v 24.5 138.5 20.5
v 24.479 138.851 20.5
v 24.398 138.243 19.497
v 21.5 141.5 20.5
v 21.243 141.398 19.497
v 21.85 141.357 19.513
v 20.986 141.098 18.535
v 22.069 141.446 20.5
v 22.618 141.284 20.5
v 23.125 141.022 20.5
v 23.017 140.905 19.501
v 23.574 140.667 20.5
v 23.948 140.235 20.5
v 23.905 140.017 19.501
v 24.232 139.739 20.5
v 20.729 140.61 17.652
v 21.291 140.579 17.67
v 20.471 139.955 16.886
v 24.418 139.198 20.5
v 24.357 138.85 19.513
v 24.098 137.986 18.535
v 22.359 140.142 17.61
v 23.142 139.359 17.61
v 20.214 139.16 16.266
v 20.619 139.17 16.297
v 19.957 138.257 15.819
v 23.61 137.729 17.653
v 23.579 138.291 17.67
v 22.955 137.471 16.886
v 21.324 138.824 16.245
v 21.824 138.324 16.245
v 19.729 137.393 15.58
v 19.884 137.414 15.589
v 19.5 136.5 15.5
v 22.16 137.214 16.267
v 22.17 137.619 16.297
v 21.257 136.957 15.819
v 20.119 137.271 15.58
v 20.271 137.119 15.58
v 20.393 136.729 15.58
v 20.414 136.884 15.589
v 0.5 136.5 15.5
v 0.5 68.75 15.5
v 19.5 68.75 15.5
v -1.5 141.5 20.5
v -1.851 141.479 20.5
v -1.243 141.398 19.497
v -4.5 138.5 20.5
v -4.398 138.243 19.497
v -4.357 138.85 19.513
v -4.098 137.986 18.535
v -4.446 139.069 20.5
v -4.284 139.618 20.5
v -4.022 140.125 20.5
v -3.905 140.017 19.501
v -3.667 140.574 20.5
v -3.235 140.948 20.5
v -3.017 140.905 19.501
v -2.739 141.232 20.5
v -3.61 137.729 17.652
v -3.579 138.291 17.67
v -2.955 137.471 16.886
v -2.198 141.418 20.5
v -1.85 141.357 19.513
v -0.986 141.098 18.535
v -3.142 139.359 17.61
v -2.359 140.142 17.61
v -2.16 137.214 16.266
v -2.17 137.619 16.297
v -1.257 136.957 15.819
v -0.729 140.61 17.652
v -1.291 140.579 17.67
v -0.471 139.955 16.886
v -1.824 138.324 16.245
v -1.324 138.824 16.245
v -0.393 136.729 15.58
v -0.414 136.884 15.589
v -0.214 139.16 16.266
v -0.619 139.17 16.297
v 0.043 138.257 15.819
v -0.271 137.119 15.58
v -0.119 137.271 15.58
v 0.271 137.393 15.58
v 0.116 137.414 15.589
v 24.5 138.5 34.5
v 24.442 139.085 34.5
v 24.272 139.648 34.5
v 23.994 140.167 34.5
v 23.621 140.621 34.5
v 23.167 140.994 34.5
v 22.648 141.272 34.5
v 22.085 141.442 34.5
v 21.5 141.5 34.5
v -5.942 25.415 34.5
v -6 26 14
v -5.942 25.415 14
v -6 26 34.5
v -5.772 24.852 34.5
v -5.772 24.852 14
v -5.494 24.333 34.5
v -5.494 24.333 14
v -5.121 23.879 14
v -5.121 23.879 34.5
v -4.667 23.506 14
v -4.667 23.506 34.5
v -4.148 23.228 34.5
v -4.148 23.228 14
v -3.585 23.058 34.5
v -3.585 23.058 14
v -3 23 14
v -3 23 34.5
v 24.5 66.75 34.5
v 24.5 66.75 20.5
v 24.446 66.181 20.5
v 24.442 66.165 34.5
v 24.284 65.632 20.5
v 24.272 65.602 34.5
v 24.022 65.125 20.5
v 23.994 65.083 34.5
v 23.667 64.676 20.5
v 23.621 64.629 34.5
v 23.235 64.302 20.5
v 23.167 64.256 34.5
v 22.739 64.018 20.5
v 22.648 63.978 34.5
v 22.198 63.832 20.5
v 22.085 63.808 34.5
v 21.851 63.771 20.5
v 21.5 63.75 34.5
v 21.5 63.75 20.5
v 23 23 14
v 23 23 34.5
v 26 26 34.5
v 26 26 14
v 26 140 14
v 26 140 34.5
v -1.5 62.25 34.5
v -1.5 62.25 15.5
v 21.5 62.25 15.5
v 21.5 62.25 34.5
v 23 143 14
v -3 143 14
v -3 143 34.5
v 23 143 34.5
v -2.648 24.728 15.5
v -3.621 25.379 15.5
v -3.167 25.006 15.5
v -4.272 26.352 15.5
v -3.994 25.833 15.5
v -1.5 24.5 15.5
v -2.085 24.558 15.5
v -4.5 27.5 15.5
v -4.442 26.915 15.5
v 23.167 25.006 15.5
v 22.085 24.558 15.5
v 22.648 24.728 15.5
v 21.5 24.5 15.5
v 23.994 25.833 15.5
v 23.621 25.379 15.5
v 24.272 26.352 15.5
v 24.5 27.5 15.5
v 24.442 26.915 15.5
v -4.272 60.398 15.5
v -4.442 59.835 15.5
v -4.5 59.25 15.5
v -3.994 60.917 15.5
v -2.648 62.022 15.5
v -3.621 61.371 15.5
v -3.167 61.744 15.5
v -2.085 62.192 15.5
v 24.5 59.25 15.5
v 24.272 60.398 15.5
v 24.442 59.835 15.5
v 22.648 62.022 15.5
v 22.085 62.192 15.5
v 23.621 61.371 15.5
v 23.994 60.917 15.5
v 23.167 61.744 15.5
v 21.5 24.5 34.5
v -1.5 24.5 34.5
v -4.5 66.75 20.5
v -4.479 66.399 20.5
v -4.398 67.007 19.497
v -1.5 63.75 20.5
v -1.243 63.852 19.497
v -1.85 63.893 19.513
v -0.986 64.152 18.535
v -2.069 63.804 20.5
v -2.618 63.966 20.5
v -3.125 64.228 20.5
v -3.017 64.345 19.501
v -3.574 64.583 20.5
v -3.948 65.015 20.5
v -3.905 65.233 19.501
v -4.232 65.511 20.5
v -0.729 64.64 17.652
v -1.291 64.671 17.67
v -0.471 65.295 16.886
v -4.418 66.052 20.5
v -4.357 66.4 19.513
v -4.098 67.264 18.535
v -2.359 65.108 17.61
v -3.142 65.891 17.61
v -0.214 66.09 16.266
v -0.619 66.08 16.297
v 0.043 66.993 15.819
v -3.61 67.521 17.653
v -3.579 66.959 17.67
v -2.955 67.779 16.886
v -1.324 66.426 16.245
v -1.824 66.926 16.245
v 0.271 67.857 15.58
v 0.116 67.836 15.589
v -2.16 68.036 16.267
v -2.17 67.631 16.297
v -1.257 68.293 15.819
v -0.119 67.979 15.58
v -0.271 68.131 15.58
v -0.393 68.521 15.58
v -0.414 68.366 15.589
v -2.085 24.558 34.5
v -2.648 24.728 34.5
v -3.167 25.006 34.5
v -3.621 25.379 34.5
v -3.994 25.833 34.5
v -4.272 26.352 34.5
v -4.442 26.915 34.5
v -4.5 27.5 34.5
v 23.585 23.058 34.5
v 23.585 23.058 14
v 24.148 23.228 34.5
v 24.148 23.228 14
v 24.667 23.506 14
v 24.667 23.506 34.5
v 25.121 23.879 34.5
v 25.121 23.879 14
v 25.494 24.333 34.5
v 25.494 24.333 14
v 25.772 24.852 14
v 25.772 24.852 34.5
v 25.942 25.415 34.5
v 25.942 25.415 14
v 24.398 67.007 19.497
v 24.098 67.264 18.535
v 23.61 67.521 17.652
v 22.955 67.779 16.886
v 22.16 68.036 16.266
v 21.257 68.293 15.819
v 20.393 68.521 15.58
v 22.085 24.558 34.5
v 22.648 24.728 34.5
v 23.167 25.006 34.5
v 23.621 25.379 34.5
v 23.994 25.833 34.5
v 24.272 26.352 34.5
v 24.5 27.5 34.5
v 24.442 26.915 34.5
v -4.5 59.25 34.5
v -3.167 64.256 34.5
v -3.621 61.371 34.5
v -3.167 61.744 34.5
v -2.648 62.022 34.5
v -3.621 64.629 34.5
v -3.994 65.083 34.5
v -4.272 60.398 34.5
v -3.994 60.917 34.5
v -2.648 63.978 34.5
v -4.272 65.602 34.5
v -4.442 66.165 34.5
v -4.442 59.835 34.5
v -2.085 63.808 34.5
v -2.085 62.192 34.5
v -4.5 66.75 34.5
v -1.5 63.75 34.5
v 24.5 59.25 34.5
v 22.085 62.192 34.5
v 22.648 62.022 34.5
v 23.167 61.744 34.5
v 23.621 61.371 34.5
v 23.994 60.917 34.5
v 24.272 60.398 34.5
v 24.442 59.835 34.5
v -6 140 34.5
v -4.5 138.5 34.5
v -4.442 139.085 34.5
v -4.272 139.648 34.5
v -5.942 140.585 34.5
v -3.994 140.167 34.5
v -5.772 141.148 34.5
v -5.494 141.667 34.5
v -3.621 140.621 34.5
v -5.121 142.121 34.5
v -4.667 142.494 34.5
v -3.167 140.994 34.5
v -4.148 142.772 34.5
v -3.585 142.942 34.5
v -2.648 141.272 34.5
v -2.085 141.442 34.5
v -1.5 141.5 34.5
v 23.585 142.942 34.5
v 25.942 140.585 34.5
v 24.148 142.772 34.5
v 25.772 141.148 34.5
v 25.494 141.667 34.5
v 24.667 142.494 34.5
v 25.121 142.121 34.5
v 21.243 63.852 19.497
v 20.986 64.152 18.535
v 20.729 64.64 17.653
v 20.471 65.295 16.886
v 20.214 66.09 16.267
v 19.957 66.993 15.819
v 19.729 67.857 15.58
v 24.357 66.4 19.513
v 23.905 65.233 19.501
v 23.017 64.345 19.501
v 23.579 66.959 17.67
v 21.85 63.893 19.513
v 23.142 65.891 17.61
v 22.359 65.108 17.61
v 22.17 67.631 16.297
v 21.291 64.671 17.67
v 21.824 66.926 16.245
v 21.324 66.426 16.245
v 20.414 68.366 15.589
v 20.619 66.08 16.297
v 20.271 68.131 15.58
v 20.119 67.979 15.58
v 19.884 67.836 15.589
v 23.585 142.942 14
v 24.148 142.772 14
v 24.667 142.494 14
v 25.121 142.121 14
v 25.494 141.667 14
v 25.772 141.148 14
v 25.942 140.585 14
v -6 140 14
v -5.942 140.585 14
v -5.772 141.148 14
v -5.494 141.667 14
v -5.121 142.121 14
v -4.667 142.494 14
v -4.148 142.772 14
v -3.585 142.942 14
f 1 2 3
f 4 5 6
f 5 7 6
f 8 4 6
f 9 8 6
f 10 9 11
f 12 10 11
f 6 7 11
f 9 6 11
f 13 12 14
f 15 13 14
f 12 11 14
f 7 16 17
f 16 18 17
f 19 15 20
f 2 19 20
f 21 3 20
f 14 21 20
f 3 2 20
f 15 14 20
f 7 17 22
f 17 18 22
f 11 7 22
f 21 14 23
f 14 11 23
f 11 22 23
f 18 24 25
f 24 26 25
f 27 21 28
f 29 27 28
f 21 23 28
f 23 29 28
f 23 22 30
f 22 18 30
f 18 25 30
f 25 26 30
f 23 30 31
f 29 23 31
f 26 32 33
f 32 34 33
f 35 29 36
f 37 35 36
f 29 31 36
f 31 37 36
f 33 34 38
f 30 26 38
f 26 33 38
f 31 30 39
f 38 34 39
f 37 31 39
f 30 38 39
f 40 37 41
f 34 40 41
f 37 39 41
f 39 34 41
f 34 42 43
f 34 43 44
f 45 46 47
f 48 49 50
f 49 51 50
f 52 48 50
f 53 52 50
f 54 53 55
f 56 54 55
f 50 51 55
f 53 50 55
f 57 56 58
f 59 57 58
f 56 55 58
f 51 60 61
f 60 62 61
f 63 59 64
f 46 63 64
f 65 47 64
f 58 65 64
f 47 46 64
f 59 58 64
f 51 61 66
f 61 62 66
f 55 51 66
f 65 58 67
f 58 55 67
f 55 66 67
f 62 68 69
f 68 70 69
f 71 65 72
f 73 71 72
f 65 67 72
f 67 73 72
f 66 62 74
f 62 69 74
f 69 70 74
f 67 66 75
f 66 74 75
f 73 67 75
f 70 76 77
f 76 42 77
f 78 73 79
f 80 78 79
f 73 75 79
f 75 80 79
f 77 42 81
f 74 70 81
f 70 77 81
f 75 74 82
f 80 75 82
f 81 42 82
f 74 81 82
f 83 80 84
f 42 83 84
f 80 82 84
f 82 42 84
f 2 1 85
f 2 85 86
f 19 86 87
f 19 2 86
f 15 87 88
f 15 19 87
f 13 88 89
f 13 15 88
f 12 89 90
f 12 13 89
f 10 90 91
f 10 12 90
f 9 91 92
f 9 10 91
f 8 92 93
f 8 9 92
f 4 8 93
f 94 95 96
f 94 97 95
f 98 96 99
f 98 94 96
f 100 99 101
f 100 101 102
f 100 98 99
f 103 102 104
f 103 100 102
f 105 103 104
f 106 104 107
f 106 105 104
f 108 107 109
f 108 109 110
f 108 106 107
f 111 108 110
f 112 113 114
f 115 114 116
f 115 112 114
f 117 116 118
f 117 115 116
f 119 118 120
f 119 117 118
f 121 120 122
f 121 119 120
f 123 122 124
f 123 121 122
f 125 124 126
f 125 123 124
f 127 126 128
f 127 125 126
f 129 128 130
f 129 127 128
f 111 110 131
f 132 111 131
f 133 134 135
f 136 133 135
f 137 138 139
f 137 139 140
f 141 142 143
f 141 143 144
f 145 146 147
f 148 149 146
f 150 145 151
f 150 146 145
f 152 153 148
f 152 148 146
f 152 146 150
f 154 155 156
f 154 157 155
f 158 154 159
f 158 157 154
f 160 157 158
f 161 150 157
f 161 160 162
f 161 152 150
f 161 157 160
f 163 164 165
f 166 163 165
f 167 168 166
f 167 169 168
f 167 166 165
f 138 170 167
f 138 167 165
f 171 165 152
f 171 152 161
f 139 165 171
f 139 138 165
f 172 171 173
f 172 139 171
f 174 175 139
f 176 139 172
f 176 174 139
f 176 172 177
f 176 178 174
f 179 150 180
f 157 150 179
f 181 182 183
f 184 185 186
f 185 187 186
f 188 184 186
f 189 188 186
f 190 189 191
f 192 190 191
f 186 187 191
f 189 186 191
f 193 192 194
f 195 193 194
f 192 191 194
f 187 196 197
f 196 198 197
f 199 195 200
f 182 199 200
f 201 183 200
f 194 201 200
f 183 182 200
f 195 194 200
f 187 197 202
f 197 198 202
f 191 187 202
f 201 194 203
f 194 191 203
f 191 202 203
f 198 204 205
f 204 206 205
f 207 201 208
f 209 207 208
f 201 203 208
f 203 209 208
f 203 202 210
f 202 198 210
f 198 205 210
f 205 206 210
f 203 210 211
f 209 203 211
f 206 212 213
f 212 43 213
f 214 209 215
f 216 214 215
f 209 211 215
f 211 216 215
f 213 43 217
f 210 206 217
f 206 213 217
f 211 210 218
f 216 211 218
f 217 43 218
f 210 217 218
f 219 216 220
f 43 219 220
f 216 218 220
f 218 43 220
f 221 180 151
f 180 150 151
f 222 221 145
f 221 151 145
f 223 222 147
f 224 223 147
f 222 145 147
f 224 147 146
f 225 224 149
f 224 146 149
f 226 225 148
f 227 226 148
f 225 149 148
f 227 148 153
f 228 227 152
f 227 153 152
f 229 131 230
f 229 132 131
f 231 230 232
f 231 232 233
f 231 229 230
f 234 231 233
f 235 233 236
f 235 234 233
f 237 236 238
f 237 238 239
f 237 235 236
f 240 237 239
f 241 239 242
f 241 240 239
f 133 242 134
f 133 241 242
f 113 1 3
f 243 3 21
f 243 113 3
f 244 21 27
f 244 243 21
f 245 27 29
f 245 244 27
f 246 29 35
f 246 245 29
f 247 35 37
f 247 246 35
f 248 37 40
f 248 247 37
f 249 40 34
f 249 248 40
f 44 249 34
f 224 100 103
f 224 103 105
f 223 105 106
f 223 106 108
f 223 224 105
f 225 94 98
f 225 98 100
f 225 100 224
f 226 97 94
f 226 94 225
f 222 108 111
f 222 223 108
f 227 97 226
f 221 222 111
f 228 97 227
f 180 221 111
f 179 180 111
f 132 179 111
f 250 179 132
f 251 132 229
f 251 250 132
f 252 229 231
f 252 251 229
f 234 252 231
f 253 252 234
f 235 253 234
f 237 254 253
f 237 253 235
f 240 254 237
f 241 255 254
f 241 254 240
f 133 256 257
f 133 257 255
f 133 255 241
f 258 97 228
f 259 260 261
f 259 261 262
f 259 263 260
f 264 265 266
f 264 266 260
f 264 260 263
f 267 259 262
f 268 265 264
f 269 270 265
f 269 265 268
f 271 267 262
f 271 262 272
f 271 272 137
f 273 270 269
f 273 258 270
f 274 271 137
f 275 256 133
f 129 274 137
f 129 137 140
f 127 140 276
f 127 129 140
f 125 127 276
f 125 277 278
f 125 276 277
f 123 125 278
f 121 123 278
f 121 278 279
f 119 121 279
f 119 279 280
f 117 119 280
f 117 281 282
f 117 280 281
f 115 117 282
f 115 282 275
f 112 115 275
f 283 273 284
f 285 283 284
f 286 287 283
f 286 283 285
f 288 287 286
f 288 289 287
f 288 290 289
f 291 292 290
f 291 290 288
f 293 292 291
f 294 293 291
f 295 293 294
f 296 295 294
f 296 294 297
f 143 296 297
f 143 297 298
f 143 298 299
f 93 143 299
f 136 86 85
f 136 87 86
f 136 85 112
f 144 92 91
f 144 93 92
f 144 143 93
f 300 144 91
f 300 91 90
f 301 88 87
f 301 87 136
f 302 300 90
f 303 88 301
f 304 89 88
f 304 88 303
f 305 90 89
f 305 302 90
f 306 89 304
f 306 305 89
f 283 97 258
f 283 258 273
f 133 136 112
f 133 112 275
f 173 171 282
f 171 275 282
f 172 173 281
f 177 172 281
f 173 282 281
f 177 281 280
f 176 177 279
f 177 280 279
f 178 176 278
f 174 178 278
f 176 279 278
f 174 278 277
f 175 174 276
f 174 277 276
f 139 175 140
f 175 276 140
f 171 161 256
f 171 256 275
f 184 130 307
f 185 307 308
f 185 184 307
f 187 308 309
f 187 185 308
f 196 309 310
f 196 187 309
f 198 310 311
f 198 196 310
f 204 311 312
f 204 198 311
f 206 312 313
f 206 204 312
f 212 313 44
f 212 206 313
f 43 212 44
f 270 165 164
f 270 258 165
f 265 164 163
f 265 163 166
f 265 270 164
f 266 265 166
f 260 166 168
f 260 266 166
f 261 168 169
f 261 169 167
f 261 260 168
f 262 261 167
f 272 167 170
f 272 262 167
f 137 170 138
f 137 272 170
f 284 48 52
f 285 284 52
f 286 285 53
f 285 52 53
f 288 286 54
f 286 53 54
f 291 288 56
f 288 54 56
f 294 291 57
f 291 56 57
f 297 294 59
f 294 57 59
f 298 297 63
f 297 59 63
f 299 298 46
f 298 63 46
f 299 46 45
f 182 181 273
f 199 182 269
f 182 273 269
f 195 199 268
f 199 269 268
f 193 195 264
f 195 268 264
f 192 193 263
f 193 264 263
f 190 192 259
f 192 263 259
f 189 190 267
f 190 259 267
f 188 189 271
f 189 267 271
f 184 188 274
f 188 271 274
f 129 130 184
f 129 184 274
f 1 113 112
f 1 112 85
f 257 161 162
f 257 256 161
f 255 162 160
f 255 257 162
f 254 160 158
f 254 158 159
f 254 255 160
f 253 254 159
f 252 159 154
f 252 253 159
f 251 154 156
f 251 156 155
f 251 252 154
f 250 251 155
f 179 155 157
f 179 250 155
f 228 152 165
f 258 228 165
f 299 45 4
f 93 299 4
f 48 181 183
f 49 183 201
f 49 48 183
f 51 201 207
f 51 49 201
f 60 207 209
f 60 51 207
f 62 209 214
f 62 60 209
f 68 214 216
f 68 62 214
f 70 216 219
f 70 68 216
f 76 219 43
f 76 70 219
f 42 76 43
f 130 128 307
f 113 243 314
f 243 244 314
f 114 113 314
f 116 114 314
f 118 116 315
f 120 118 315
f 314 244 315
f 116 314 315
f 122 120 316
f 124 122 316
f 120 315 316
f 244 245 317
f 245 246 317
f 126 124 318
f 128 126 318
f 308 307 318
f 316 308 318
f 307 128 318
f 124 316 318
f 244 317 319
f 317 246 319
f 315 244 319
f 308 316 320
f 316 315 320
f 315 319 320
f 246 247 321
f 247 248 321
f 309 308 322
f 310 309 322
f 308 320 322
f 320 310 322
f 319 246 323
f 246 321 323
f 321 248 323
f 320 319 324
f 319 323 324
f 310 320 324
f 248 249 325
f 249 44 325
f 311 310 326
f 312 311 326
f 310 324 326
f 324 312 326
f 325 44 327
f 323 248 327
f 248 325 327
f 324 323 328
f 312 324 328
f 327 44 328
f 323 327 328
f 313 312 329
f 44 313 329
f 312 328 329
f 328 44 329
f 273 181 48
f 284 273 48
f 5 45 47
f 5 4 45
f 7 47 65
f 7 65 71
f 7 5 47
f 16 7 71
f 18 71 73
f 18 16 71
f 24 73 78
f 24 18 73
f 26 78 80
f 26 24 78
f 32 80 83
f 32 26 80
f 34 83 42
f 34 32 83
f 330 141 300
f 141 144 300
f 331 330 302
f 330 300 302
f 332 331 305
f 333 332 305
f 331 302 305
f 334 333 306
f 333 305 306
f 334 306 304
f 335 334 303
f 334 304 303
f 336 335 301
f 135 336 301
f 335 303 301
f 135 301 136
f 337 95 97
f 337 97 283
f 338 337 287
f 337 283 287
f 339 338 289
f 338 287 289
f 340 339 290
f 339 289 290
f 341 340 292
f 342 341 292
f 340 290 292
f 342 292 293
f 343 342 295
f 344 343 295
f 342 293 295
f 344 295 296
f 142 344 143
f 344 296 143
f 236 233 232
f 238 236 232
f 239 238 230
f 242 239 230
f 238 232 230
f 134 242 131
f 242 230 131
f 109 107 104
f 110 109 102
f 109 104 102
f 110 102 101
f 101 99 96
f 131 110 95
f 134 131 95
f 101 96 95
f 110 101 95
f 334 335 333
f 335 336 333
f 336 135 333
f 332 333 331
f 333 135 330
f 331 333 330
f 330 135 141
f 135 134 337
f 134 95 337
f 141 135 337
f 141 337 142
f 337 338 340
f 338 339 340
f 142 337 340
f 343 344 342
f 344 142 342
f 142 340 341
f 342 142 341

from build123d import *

# Parameters (mm, degrees)
SKETCH012_W    = 32
SKETCH012_H    = 120
PAD005_DEPTH   = 20.5
THICKNESS001_T = -1.5
SKETCH013_W    = 1.5
SKETCH013_H    = 20.5
PAD006_DEPTH   = 29
FILLET007_R    = 3
FILLET008_R    = 5


with BuildPart() as part:
    # Sketch012 → Pad005 (new body)
    with BuildSketch(Plane.XY):
        Rectangle(SKETCH012_W, SKETCH012_H)
    extrude(amount=PAD005_DEPTH)

    # Thickness001
    thickness001_openings = [part.faces().sort_by_distance(p)[0] for p in [
        (0, 0, 20.5),
    ]]
    offset(amount=THICKNESS001_T, openings=thickness001_openings)

    # Sketch013 (on DatumPlane) → Pad006 (join)
    with BuildSketch(Plane(origin=(-14.5, -20, 0), x_dir=(0, 1, 0), z_dir=(1, 0, 0))):
        with Locations((0, 10.25)):
            Rectangle(SKETCH013_W, SKETCH013_H)
    extrude(amount=PAD006_DEPTH)

    # Fillet007
    fillet007_edges = [part.edges().sort_by_distance(p)[0] for p in [
        (-14.5, 58.5, 11),
        (14.5, 58.5, 11),
        (16, 60, 10.25),
        (-16, 60, 10.25),
        (-14.5, -58.5, 11),
        (-16, -60, 10.25),
        (-14.5, -20.75, 11),
        (-14.5, -19.25, 11),
        (14.5, -19.25, 11),
        (14.5, -20.75, 11),
        (14.5, -58.5, 11),
        (16, -60, 10.25),
    ]]
    fillet(fillet007_edges, radius=FILLET007_R)

    # Fillet008
    fillet008_edges = [part.edges().sort_by_distance(p)[0] for p in [
        (0, 58.5, 1.5),
        (-13.62132, 57.62132, 1.5),
        (13.62132, 57.62132, 1.5),
        (-14.5, 19.625, 1.5),
        (14.5, 19.625, 1.5),
        (-13.62132, -18.37132, 1.5),
        (13.62132, -18.37132, 1.5),
        (0, -19.25, 1.5),
    ]]
    fillet(fillet008_edges, radius=FILLET008_R)


with BuildPart() as part_1:
    # Body004 placement: moved
    add(part.part.moved(Location((-22, 83, 14))))


with BuildPart() as part_2:
    # Body005 placement: moved
    add(part_1.part.moved(Location((32, 0, 0))))


solid = part_2.part
